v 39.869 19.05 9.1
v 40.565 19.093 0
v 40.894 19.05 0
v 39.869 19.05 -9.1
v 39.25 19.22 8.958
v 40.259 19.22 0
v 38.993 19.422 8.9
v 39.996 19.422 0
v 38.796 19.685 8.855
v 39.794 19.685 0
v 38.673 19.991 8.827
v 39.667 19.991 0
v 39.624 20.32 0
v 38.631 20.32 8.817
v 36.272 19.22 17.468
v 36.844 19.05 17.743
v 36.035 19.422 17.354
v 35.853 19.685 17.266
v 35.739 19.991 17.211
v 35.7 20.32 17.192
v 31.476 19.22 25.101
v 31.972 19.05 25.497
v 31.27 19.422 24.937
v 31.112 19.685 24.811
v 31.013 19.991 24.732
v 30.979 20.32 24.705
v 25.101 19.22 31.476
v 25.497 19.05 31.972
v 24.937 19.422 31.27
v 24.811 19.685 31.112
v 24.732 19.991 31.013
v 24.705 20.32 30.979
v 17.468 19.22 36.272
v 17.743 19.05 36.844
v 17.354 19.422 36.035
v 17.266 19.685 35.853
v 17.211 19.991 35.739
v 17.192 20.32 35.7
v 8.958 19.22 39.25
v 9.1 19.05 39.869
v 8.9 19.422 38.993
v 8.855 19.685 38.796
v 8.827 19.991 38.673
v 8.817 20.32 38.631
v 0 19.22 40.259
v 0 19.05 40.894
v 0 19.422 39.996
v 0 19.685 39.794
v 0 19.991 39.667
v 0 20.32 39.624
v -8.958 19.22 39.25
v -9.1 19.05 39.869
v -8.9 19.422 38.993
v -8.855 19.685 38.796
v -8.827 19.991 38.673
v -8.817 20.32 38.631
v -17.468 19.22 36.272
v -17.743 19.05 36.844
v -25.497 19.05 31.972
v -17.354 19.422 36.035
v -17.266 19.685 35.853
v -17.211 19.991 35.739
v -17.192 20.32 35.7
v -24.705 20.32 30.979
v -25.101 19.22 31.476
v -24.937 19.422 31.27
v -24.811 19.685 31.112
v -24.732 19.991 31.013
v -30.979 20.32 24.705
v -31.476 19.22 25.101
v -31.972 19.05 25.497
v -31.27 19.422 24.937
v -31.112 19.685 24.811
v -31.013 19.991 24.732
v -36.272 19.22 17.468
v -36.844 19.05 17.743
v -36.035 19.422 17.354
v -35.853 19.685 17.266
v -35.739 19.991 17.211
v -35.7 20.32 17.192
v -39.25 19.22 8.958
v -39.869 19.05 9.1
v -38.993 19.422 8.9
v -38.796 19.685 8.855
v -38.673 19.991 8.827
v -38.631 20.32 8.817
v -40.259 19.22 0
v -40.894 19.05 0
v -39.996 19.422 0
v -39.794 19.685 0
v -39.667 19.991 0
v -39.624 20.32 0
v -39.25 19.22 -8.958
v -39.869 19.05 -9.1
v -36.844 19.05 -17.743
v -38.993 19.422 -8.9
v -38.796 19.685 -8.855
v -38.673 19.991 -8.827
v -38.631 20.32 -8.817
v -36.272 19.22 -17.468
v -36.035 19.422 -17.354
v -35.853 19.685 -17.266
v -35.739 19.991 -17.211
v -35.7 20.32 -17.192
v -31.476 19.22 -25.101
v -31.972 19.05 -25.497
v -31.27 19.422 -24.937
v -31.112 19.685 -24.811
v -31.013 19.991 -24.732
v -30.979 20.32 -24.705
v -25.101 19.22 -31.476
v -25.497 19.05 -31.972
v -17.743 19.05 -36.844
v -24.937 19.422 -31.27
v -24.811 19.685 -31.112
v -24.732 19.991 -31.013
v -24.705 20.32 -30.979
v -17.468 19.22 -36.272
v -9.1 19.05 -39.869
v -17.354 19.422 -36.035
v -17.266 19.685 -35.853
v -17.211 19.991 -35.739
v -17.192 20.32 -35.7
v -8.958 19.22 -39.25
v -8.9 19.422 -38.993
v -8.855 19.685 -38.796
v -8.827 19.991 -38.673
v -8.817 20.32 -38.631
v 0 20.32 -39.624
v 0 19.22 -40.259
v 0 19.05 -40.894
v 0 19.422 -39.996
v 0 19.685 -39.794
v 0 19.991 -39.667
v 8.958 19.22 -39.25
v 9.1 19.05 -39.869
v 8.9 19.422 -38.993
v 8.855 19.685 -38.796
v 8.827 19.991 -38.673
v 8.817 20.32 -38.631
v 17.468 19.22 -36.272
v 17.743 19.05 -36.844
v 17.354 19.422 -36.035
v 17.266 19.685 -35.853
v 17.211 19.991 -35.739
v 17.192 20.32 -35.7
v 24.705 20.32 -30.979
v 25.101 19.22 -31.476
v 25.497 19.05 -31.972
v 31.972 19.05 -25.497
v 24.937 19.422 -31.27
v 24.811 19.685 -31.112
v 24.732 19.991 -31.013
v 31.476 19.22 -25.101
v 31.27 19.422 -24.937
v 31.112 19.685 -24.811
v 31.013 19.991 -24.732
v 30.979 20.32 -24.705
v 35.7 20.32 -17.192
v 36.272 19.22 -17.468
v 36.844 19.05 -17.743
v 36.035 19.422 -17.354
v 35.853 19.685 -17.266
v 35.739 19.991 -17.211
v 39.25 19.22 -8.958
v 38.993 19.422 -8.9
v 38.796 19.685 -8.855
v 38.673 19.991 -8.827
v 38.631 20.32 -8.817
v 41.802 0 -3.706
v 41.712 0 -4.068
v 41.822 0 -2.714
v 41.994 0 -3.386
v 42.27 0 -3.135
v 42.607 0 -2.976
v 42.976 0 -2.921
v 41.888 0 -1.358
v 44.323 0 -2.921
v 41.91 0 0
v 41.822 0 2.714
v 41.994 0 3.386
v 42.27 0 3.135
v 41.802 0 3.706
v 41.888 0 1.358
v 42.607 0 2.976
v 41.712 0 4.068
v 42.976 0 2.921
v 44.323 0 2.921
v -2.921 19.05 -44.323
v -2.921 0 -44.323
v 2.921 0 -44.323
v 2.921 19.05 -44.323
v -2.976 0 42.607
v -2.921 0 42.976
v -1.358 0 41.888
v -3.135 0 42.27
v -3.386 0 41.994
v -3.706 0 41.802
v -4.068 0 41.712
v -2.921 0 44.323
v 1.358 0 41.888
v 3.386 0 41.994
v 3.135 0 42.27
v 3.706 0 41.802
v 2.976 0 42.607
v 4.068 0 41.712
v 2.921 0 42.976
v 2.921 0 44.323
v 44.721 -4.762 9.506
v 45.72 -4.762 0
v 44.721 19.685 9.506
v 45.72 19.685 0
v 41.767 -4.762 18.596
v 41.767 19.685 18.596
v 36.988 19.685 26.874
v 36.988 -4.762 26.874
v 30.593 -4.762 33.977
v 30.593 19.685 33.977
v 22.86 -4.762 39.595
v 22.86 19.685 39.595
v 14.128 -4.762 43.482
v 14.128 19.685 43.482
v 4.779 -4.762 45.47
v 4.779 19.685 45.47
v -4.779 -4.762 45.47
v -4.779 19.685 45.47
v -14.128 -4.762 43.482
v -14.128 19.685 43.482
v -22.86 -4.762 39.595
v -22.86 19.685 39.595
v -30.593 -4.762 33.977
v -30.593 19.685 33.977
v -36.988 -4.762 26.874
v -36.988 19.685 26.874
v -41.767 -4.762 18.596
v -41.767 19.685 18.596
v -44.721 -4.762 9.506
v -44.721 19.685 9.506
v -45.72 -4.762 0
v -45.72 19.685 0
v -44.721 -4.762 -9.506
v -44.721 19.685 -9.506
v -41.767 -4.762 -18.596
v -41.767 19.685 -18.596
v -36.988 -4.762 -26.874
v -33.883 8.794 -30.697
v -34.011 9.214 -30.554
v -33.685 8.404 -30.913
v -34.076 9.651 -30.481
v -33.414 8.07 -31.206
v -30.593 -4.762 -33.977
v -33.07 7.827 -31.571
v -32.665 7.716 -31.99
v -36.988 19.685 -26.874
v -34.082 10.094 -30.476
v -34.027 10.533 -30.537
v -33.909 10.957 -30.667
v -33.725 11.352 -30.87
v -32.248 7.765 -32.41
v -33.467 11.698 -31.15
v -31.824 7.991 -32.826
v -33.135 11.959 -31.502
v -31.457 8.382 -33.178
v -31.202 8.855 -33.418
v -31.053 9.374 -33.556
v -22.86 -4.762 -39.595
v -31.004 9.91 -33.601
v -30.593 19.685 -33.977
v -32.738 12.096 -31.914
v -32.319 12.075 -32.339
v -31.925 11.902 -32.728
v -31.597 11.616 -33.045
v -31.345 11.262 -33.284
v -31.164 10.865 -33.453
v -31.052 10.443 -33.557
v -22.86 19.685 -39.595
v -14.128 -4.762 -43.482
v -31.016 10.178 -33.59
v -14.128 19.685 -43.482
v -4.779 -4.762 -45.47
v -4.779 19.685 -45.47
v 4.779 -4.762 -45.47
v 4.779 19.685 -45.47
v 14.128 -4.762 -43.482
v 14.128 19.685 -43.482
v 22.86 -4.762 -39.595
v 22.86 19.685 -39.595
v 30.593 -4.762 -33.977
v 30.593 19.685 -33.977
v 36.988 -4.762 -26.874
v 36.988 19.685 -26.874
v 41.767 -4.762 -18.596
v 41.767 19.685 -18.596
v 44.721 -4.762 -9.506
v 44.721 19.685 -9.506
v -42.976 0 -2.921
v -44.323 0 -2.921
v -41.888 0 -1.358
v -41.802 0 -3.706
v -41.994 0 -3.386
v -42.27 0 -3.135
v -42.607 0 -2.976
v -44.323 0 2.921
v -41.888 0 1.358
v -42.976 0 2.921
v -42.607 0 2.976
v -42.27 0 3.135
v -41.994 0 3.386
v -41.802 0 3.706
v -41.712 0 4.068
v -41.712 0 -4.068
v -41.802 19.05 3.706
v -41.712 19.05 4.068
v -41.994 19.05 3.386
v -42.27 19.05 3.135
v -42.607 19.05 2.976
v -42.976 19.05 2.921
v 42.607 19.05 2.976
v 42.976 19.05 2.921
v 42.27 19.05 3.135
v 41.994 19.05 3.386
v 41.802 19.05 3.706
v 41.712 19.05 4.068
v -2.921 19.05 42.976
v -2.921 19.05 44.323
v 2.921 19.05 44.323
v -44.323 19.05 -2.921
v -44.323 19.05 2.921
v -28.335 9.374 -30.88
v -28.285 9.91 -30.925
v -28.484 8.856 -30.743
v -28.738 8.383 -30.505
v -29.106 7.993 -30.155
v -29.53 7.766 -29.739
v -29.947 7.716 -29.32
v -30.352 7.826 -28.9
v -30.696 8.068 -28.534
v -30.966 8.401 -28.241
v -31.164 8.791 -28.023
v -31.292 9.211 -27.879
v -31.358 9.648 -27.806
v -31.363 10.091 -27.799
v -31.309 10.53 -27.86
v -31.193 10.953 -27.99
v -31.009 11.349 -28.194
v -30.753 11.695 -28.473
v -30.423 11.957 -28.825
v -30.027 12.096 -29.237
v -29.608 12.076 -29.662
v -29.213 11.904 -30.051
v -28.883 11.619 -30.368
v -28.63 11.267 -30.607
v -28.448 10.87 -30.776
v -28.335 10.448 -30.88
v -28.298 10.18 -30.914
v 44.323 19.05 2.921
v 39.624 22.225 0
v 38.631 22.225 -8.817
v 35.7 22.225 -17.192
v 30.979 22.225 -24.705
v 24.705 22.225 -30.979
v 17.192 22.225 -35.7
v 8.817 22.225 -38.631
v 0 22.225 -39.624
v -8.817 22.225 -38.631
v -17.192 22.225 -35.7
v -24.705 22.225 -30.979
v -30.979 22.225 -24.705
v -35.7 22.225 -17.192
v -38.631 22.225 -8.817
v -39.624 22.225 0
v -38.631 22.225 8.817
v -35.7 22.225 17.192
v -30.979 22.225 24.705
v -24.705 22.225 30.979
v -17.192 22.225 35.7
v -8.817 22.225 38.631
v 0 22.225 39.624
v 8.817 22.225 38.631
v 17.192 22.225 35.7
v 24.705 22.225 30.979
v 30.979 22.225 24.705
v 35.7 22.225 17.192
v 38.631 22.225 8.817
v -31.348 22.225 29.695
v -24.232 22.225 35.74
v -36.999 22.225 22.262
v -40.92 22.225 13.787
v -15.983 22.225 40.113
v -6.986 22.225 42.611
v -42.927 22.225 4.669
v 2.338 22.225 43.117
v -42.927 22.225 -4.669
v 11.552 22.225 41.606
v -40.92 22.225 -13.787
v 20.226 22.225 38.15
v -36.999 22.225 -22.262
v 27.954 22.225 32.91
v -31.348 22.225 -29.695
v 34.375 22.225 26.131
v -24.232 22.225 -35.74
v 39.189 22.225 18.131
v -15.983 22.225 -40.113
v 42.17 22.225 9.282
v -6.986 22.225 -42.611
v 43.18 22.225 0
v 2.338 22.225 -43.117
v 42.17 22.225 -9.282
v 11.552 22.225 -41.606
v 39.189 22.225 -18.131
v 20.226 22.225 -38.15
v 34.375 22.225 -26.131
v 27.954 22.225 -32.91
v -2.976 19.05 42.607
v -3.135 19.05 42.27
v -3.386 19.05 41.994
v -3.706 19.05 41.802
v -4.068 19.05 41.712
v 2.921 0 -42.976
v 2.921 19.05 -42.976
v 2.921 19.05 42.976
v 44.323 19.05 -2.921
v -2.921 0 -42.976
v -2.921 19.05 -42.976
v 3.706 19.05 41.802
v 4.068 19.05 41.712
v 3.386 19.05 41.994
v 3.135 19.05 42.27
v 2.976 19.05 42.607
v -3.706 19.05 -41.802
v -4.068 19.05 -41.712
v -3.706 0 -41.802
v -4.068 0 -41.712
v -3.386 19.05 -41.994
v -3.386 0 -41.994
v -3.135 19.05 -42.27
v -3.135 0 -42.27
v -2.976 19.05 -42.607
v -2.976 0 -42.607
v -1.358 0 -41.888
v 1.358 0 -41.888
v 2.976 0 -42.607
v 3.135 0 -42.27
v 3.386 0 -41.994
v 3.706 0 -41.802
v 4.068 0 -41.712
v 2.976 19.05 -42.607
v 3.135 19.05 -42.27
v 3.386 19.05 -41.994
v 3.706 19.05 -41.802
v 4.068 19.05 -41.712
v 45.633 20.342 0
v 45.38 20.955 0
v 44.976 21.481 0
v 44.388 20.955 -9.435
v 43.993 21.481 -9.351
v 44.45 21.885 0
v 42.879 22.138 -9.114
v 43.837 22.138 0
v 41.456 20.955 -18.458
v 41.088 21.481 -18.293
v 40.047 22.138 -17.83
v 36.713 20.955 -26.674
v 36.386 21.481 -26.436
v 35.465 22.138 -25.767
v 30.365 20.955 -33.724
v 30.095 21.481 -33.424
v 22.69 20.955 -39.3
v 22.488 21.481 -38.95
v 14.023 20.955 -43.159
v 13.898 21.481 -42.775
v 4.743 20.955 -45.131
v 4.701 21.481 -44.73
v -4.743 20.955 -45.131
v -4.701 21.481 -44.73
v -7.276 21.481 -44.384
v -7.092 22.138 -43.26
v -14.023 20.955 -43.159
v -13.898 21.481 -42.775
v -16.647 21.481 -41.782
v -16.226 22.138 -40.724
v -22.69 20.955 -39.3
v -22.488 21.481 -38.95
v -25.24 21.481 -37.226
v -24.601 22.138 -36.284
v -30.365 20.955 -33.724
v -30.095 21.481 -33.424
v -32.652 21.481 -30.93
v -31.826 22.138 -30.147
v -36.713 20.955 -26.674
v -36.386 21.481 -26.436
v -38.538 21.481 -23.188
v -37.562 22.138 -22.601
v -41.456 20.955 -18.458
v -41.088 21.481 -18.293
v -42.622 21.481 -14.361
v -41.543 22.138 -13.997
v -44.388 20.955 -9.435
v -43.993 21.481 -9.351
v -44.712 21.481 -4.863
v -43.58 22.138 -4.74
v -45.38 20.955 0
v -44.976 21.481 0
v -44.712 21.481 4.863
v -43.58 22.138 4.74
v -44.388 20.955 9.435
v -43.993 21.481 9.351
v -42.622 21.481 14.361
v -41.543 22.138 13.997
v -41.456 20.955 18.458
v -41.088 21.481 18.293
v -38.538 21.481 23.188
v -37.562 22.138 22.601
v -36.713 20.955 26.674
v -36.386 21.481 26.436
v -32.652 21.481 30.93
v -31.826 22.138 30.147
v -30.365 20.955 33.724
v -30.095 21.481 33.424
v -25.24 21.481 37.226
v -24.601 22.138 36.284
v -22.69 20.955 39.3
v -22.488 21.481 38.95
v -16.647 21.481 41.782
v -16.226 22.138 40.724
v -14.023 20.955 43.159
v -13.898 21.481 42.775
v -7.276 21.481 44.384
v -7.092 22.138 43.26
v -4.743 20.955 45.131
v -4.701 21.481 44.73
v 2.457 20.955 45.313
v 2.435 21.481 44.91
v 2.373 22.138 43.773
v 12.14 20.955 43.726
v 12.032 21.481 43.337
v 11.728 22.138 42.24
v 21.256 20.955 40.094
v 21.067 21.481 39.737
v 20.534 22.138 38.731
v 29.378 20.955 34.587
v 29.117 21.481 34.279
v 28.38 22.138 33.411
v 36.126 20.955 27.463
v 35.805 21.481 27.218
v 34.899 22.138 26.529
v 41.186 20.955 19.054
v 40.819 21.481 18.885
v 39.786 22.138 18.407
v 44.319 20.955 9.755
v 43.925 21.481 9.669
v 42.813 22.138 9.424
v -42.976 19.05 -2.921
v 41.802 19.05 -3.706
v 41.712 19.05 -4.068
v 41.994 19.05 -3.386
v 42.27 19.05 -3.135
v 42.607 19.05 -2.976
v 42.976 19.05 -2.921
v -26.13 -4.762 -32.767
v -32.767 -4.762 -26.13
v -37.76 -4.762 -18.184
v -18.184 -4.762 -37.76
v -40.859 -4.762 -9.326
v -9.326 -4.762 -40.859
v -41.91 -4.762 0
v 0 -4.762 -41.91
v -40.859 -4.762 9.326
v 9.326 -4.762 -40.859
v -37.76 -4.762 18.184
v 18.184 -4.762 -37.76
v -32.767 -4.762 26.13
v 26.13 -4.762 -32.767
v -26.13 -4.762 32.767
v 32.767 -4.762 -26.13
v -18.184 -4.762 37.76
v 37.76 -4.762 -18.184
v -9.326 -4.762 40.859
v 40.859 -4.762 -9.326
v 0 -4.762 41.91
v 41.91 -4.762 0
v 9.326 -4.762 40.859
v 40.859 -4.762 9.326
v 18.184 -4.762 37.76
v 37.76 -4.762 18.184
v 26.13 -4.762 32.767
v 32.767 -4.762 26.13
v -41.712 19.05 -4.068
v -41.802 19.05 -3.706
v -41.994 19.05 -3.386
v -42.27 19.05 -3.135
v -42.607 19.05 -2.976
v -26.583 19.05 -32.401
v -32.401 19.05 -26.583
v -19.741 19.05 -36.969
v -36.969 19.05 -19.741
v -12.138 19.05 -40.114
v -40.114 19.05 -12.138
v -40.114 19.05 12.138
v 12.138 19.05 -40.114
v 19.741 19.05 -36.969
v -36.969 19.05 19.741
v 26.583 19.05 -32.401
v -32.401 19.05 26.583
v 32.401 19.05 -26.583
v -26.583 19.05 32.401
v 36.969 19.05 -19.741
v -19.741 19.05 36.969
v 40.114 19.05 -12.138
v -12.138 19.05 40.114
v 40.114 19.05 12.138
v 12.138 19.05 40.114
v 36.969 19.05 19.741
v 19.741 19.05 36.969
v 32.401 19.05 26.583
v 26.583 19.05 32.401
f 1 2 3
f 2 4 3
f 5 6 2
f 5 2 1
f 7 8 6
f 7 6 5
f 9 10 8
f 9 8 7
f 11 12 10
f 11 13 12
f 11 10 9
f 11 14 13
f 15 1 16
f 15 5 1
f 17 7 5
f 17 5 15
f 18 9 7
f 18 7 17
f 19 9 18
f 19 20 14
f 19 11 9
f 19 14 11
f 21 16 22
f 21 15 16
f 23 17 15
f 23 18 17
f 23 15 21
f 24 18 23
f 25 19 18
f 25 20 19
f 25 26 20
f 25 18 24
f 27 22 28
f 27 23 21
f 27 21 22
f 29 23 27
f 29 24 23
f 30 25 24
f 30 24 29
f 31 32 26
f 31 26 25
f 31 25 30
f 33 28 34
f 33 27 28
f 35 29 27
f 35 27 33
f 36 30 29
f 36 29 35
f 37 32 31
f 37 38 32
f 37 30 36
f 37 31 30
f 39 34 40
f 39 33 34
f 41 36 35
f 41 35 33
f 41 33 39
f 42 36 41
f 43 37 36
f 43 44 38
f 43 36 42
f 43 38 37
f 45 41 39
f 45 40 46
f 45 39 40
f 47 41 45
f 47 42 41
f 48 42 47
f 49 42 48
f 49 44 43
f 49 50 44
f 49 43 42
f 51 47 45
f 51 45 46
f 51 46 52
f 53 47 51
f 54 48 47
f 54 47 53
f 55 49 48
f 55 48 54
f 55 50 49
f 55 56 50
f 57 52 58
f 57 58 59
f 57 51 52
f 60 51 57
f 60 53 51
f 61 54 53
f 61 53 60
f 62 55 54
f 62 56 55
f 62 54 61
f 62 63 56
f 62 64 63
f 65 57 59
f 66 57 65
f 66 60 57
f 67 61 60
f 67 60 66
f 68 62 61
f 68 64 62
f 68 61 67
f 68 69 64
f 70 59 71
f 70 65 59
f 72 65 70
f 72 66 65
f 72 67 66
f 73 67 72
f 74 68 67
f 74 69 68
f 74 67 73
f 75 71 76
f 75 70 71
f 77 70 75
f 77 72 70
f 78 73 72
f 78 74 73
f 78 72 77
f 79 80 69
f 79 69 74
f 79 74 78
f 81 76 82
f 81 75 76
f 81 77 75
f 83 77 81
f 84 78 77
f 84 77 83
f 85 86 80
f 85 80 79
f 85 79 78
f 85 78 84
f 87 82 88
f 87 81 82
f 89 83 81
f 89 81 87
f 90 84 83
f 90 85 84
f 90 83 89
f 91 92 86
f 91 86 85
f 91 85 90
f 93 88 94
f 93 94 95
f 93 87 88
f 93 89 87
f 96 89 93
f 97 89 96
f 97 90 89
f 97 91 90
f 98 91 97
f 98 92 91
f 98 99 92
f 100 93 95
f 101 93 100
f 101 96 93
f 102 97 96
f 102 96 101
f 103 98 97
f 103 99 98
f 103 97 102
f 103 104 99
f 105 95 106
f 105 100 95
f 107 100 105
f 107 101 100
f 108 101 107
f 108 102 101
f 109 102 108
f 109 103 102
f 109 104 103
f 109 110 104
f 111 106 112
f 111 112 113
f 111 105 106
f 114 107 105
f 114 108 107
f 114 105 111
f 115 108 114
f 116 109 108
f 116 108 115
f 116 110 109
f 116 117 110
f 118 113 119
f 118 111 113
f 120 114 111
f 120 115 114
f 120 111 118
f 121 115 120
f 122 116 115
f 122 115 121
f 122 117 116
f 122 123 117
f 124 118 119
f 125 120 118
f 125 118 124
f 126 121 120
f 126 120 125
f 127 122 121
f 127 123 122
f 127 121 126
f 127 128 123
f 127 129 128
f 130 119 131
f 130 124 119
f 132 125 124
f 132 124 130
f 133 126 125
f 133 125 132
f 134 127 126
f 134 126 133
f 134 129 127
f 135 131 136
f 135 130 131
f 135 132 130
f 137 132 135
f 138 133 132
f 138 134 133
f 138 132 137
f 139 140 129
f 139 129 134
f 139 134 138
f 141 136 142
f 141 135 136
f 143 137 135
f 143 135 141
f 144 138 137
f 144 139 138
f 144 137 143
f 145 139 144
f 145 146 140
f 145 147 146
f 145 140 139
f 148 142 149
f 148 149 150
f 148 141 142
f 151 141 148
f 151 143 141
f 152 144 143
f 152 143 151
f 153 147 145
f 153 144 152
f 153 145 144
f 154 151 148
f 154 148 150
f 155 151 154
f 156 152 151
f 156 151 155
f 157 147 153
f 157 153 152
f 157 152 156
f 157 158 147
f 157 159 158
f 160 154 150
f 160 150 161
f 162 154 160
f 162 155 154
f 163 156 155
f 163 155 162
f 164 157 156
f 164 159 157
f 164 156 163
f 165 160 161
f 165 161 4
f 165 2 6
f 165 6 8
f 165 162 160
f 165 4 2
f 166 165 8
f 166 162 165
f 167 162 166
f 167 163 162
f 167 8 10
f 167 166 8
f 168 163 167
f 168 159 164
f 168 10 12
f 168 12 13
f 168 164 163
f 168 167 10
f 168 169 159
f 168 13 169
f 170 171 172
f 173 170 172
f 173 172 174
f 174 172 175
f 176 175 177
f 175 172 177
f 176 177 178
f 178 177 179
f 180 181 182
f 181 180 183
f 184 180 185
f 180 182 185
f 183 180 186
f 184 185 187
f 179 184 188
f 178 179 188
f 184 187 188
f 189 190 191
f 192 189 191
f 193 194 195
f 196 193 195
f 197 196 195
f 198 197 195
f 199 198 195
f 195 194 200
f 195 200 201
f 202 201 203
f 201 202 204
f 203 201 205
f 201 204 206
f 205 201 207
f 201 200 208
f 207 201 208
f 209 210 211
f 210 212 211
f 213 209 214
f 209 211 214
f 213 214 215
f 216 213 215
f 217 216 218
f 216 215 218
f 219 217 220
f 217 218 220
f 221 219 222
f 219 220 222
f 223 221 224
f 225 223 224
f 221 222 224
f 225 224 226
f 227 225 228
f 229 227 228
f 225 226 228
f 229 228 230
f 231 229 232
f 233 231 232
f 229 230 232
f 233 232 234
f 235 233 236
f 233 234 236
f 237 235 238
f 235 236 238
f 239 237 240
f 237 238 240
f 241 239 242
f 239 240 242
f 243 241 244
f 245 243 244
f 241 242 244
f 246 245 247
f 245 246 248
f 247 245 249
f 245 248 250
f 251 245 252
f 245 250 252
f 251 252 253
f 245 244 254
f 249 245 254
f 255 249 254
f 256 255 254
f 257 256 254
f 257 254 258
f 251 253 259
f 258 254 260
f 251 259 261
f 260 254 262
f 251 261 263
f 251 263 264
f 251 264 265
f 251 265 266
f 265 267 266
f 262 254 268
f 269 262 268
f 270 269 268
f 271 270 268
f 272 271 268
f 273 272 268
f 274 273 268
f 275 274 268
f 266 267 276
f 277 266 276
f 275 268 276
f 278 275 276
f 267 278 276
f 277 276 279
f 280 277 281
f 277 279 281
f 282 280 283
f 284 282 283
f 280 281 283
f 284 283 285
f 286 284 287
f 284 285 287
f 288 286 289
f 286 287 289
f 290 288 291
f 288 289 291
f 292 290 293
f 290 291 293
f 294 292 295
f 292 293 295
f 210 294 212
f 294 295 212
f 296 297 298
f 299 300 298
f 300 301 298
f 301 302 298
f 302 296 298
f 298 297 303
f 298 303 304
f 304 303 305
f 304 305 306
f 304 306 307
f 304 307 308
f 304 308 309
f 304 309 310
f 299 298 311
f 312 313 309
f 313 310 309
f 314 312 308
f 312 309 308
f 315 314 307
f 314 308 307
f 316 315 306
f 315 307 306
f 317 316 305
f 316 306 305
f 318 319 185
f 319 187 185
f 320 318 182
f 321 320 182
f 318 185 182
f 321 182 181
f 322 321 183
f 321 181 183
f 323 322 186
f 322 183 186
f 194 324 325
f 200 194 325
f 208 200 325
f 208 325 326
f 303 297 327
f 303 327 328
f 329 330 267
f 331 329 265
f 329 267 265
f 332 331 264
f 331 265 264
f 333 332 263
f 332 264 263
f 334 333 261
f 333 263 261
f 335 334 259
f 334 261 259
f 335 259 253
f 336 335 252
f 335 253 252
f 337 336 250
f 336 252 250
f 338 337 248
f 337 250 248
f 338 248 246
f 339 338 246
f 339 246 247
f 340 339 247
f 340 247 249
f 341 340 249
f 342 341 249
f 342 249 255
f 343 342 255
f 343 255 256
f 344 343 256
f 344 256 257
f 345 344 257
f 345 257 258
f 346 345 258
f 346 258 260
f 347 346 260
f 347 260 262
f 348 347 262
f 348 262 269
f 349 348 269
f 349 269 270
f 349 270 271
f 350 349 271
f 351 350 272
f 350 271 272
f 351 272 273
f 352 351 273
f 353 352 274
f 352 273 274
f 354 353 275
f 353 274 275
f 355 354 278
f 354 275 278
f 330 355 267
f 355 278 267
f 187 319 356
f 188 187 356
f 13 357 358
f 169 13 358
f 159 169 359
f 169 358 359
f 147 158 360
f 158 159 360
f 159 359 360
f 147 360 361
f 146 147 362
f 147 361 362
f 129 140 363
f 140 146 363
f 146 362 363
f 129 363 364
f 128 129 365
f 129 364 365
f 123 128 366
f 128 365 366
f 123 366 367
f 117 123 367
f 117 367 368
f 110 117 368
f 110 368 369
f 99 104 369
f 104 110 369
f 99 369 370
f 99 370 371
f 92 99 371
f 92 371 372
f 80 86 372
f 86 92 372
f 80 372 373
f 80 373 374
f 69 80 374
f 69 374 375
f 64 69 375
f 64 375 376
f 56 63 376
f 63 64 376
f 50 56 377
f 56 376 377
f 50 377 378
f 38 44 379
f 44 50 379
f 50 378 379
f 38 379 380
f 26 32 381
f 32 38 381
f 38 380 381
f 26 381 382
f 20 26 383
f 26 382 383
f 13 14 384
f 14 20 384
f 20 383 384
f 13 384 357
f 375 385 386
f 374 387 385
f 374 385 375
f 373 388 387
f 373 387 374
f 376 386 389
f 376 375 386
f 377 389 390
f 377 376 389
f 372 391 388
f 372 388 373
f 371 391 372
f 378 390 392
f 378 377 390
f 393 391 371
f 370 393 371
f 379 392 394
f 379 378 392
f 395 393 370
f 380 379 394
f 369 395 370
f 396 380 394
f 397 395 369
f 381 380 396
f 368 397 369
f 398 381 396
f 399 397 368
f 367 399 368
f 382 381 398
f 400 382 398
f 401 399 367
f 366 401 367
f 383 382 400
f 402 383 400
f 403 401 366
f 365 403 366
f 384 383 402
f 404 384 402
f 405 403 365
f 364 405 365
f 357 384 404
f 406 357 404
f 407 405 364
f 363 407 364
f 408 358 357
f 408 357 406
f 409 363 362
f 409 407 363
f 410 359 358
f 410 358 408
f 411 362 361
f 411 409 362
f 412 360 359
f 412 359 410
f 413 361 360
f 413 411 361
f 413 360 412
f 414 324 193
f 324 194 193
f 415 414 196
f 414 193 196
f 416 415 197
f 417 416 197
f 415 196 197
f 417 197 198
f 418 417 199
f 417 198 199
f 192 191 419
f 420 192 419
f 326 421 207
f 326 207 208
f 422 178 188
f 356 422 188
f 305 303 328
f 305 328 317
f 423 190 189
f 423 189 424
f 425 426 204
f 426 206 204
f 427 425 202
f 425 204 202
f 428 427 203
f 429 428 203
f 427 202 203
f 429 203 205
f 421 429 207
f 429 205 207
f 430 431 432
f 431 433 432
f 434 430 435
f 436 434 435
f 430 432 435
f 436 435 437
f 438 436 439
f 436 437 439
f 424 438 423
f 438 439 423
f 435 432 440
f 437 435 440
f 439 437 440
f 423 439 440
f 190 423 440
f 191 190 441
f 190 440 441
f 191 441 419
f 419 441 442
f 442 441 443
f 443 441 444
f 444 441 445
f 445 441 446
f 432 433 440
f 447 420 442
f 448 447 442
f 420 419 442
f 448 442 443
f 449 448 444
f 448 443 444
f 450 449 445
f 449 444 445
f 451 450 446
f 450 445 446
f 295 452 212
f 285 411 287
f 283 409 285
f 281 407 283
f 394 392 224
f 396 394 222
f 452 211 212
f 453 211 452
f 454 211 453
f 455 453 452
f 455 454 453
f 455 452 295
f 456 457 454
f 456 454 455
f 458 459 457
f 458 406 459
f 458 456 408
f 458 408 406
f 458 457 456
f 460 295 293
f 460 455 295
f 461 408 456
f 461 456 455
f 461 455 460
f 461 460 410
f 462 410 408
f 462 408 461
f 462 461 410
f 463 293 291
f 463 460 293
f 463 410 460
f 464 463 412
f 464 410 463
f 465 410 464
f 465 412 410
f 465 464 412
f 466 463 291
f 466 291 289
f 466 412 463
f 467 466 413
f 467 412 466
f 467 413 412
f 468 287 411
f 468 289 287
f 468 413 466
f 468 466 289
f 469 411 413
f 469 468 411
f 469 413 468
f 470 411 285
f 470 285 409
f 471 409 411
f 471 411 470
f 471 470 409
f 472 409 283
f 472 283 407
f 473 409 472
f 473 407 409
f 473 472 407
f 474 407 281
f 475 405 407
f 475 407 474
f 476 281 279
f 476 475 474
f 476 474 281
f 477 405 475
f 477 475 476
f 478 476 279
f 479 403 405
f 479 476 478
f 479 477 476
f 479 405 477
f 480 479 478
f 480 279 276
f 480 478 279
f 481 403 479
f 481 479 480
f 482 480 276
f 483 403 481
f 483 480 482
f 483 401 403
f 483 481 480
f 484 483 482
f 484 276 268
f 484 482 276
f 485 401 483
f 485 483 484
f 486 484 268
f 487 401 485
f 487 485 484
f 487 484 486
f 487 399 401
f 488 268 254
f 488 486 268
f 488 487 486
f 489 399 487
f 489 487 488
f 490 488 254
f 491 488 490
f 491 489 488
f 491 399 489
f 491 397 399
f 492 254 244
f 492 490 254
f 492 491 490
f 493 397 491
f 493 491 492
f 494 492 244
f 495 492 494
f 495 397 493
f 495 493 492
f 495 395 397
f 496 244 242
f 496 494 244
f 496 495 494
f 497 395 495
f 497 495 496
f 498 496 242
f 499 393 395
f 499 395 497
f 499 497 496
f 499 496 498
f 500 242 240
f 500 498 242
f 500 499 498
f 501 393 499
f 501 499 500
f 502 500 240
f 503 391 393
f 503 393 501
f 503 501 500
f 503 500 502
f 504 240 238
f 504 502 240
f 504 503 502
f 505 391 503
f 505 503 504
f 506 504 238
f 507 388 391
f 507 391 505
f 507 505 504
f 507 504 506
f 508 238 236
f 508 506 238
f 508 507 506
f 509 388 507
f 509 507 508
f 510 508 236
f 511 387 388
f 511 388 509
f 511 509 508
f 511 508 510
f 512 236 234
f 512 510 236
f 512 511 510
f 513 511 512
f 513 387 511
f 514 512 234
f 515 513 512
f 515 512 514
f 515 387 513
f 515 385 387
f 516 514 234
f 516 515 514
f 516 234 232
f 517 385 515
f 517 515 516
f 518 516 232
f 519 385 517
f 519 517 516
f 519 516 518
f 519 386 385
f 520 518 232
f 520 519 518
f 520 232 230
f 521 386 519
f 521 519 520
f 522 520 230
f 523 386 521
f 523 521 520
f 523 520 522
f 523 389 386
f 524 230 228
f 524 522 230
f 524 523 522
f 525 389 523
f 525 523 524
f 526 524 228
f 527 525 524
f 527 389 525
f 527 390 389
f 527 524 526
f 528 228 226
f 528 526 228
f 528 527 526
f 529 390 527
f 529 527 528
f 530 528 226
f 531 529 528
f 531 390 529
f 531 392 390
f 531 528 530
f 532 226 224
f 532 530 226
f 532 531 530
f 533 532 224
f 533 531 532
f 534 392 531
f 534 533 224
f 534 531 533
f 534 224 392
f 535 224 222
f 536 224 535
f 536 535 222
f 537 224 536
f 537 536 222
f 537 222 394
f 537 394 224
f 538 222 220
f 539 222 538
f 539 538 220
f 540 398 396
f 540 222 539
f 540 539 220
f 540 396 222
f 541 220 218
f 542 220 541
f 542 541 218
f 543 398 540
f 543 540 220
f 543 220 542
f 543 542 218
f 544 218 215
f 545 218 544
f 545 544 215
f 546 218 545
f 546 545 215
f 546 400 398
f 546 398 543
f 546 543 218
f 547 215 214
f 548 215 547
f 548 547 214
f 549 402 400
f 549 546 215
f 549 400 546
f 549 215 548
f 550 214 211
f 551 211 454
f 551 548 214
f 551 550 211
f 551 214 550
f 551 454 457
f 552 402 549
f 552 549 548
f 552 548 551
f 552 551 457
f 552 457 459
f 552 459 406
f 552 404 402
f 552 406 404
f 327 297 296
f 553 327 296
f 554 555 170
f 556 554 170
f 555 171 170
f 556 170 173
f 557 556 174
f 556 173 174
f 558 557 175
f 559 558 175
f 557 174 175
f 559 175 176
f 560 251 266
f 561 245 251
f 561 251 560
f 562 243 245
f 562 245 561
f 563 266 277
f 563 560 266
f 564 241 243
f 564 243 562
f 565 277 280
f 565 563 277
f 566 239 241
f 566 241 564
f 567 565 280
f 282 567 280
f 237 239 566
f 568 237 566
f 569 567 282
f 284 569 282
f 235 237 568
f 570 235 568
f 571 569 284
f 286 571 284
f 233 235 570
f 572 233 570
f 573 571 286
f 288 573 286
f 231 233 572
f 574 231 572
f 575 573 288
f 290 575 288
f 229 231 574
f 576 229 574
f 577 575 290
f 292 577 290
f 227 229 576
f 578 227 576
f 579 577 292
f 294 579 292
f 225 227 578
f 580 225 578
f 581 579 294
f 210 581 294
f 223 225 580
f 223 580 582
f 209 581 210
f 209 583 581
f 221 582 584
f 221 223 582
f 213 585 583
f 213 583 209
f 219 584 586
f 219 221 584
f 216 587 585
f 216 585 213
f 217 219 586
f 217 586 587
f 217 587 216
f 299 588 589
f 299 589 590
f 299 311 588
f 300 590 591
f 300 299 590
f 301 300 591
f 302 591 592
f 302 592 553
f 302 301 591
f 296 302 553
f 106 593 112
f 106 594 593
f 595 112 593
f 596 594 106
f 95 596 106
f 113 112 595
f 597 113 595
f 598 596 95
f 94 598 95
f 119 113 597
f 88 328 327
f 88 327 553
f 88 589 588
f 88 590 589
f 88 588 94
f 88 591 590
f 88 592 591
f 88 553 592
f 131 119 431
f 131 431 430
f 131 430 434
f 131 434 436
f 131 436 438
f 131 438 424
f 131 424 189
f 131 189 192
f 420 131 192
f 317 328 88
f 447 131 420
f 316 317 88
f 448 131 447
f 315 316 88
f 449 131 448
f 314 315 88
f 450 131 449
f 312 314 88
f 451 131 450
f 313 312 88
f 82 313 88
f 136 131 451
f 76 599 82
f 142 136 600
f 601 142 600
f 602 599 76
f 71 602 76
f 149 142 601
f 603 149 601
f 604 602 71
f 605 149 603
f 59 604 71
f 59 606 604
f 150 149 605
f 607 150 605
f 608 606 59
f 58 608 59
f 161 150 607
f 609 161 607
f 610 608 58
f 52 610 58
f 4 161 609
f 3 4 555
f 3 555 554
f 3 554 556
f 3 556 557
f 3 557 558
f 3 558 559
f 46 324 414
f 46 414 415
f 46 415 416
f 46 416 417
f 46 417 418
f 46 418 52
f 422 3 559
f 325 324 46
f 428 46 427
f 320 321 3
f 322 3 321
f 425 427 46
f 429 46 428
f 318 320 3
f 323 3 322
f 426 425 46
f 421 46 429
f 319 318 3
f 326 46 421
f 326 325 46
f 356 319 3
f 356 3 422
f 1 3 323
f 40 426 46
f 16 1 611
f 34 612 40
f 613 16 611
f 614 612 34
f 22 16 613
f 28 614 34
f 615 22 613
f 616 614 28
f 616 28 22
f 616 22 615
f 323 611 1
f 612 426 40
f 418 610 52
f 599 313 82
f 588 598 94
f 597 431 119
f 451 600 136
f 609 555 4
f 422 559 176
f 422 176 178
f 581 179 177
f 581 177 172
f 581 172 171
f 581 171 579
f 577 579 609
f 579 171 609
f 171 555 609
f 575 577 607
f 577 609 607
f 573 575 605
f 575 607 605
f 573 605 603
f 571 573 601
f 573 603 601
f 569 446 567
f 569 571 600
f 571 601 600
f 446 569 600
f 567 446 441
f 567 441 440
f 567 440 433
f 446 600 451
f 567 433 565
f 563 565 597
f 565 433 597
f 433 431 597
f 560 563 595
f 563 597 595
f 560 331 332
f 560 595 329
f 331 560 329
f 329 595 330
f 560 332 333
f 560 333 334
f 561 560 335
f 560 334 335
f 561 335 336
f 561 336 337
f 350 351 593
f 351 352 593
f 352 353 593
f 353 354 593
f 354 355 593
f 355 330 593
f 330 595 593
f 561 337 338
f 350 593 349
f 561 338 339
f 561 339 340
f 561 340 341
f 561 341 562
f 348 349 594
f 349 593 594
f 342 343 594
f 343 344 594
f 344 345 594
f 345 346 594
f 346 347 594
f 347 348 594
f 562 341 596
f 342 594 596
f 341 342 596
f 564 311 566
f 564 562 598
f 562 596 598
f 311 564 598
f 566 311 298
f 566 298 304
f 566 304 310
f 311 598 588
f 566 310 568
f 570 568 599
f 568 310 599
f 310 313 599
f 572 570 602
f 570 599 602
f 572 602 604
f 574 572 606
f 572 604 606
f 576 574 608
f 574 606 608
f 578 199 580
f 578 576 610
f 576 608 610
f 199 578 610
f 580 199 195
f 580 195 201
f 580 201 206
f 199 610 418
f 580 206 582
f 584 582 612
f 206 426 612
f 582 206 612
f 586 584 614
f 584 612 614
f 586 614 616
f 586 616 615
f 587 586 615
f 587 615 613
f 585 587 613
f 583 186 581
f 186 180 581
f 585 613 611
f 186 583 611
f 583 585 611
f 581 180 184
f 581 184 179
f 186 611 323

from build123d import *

# Parameters (mm, degrees)
SKETCH1_R                       = 45.72
BOSS_EXTRUDE1_DEPTH             = 22.225
SKETCH6_R                       = 39.624
CUT_EXTRUDE1_DEPTH              = 23.225
SKETCH8_R                       = 41.91
CUT_EXTRUDE2_DEPTH              = 19.05
FILLET1_R                       = 2.54
F_17_0_173_DIAMETER_HOLE2_D     = 4.3942
F_17_0_173_DIAMETER_HOLE2_DEPTH = 22.745829939
SKETCH25_W                      = 88.646
SKETCH25_H                      = 5.842
CUT_EXTRUDE7_DEPTH              = 19.05
SKETCH27_W                      = 5.842
SKETCH27_H                      = 88.646
CUT_EXTRUDE8_DEPTH              = 19.05
FILLET2_R                       = 1.27
FILLET3_R                       = 1.27
SKETCH36_R                      = 45.72
BOSS_EXTRUDE4_DEPTH             = 4.7625
SKETCH37_R                      = 41.91
CUT_EXTRUDE11_DEPTH             = 4.7625


with BuildPart() as part:
    # Sketch1 → Boss-Extrude1 (new body)
    with BuildSketch(Plane(origin=(0, 0, 0), x_dir=(1, 0, 0), z_dir=(0, 1, 0))):
        Circle(SKETCH1_R)
    extrude(amount=BOSS_EXTRUDE1_DEPTH)

    # Sketch6 → Cut-Extrude1 (cut, through all)
    with BuildSketch(Plane(origin=(0, 22.225, 0), x_dir=(1, 0, 0), z_dir=(0, 1, 0))):
        Circle(SKETCH6_R)
    extrude(amount=-CUT_EXTRUDE1_DEPTH, mode=Mode.SUBTRACT)

    # Sketch8 → Cut-Extrude2 (cut)
    with BuildSketch(Plane.XZ):
        Circle(SKETCH8_R)
    extrude(amount=-CUT_EXTRUDE2_DEPTH, mode=Mode.SUBTRACT)

    # Fillet1
    fillet1_edges = [part.edges().sort_by_distance(p)[0] for p in [
        (-45.72, 22.225, 0),
    ]]
    fillet(fillet1_edges, radius=FILLET1_R)

    # #17 (0.173) Diameter Hole2
    with Locations(Plane(origin=(-29.867831461, 9.910321026, -29.40001265), x_dir=(-0.701503523, 0, 0.712665986), z_dir=(0.712665986, 0, 0.701503523))):
        with Locations((0, 0)):
            Hole(F_17_0_173_DIAMETER_HOLE2_D / 2, depth=F_17_0_173_DIAMETER_HOLE2_DEPTH)

    # Sketch25 → Cut-Extrude7 (cut)
    with BuildSketch(Plane.XZ):
        Rectangle(SKETCH25_W, SKETCH25_H)
    extrude(amount=-CUT_EXTRUDE7_DEPTH, mode=Mode.SUBTRACT)

    # Sketch27 → Cut-Extrude8 (cut)
    with BuildSketch(Plane.XZ):
        Rectangle(SKETCH27_W, SKETCH27_H)
    extrude(amount=-CUT_EXTRUDE8_DEPTH, mode=Mode.SUBTRACT)

    # Fillet2
    fillet2_edges = [part.edges().sort_by_distance(p)[0] for p in [
        (41.808083656, 9.525, 2.921),
        (-41.808083656, 9.525, 2.921),
        (41.808083656, 9.525, -2.921),
        (-41.808083656, 9.525, -2.921),
        (2.921, 9.525, 41.808083656),
        (-2.921, 9.525, 41.808083656),
        (-2.921, 9.525, -41.808083656),
        (2.921, 9.525, -41.808083656),
    ]]
    fillet(fillet2_edges, radius=FILLET2_R)

    # Fillet3
    fillet3_edges = [part.edges().sort_by_distance(p)[0] for p in [
        (-39.624, 19.05, 0),
    ]]
    fillet(fillet3_edges, radius=FILLET3_R)

    # Sketch36 → Boss-Extrude4 (add)
    with BuildSketch(Plane.XZ):
        Circle(SKETCH36_R)
    extrude(amount=BOSS_EXTRUDE4_DEPTH)

    # Sketch37 → Cut-Extrude11 (cut)
    with BuildSketch(Plane(origin=(0, 0, 0), x_dir=(1, 0, 0), z_dir=(0, 1, 0))):
        Circle(SKETCH37_R)
    extrude(amount=-CUT_EXTRUDE11_DEPTH, mode=Mode.SUBTRACT)


solid = part.part
